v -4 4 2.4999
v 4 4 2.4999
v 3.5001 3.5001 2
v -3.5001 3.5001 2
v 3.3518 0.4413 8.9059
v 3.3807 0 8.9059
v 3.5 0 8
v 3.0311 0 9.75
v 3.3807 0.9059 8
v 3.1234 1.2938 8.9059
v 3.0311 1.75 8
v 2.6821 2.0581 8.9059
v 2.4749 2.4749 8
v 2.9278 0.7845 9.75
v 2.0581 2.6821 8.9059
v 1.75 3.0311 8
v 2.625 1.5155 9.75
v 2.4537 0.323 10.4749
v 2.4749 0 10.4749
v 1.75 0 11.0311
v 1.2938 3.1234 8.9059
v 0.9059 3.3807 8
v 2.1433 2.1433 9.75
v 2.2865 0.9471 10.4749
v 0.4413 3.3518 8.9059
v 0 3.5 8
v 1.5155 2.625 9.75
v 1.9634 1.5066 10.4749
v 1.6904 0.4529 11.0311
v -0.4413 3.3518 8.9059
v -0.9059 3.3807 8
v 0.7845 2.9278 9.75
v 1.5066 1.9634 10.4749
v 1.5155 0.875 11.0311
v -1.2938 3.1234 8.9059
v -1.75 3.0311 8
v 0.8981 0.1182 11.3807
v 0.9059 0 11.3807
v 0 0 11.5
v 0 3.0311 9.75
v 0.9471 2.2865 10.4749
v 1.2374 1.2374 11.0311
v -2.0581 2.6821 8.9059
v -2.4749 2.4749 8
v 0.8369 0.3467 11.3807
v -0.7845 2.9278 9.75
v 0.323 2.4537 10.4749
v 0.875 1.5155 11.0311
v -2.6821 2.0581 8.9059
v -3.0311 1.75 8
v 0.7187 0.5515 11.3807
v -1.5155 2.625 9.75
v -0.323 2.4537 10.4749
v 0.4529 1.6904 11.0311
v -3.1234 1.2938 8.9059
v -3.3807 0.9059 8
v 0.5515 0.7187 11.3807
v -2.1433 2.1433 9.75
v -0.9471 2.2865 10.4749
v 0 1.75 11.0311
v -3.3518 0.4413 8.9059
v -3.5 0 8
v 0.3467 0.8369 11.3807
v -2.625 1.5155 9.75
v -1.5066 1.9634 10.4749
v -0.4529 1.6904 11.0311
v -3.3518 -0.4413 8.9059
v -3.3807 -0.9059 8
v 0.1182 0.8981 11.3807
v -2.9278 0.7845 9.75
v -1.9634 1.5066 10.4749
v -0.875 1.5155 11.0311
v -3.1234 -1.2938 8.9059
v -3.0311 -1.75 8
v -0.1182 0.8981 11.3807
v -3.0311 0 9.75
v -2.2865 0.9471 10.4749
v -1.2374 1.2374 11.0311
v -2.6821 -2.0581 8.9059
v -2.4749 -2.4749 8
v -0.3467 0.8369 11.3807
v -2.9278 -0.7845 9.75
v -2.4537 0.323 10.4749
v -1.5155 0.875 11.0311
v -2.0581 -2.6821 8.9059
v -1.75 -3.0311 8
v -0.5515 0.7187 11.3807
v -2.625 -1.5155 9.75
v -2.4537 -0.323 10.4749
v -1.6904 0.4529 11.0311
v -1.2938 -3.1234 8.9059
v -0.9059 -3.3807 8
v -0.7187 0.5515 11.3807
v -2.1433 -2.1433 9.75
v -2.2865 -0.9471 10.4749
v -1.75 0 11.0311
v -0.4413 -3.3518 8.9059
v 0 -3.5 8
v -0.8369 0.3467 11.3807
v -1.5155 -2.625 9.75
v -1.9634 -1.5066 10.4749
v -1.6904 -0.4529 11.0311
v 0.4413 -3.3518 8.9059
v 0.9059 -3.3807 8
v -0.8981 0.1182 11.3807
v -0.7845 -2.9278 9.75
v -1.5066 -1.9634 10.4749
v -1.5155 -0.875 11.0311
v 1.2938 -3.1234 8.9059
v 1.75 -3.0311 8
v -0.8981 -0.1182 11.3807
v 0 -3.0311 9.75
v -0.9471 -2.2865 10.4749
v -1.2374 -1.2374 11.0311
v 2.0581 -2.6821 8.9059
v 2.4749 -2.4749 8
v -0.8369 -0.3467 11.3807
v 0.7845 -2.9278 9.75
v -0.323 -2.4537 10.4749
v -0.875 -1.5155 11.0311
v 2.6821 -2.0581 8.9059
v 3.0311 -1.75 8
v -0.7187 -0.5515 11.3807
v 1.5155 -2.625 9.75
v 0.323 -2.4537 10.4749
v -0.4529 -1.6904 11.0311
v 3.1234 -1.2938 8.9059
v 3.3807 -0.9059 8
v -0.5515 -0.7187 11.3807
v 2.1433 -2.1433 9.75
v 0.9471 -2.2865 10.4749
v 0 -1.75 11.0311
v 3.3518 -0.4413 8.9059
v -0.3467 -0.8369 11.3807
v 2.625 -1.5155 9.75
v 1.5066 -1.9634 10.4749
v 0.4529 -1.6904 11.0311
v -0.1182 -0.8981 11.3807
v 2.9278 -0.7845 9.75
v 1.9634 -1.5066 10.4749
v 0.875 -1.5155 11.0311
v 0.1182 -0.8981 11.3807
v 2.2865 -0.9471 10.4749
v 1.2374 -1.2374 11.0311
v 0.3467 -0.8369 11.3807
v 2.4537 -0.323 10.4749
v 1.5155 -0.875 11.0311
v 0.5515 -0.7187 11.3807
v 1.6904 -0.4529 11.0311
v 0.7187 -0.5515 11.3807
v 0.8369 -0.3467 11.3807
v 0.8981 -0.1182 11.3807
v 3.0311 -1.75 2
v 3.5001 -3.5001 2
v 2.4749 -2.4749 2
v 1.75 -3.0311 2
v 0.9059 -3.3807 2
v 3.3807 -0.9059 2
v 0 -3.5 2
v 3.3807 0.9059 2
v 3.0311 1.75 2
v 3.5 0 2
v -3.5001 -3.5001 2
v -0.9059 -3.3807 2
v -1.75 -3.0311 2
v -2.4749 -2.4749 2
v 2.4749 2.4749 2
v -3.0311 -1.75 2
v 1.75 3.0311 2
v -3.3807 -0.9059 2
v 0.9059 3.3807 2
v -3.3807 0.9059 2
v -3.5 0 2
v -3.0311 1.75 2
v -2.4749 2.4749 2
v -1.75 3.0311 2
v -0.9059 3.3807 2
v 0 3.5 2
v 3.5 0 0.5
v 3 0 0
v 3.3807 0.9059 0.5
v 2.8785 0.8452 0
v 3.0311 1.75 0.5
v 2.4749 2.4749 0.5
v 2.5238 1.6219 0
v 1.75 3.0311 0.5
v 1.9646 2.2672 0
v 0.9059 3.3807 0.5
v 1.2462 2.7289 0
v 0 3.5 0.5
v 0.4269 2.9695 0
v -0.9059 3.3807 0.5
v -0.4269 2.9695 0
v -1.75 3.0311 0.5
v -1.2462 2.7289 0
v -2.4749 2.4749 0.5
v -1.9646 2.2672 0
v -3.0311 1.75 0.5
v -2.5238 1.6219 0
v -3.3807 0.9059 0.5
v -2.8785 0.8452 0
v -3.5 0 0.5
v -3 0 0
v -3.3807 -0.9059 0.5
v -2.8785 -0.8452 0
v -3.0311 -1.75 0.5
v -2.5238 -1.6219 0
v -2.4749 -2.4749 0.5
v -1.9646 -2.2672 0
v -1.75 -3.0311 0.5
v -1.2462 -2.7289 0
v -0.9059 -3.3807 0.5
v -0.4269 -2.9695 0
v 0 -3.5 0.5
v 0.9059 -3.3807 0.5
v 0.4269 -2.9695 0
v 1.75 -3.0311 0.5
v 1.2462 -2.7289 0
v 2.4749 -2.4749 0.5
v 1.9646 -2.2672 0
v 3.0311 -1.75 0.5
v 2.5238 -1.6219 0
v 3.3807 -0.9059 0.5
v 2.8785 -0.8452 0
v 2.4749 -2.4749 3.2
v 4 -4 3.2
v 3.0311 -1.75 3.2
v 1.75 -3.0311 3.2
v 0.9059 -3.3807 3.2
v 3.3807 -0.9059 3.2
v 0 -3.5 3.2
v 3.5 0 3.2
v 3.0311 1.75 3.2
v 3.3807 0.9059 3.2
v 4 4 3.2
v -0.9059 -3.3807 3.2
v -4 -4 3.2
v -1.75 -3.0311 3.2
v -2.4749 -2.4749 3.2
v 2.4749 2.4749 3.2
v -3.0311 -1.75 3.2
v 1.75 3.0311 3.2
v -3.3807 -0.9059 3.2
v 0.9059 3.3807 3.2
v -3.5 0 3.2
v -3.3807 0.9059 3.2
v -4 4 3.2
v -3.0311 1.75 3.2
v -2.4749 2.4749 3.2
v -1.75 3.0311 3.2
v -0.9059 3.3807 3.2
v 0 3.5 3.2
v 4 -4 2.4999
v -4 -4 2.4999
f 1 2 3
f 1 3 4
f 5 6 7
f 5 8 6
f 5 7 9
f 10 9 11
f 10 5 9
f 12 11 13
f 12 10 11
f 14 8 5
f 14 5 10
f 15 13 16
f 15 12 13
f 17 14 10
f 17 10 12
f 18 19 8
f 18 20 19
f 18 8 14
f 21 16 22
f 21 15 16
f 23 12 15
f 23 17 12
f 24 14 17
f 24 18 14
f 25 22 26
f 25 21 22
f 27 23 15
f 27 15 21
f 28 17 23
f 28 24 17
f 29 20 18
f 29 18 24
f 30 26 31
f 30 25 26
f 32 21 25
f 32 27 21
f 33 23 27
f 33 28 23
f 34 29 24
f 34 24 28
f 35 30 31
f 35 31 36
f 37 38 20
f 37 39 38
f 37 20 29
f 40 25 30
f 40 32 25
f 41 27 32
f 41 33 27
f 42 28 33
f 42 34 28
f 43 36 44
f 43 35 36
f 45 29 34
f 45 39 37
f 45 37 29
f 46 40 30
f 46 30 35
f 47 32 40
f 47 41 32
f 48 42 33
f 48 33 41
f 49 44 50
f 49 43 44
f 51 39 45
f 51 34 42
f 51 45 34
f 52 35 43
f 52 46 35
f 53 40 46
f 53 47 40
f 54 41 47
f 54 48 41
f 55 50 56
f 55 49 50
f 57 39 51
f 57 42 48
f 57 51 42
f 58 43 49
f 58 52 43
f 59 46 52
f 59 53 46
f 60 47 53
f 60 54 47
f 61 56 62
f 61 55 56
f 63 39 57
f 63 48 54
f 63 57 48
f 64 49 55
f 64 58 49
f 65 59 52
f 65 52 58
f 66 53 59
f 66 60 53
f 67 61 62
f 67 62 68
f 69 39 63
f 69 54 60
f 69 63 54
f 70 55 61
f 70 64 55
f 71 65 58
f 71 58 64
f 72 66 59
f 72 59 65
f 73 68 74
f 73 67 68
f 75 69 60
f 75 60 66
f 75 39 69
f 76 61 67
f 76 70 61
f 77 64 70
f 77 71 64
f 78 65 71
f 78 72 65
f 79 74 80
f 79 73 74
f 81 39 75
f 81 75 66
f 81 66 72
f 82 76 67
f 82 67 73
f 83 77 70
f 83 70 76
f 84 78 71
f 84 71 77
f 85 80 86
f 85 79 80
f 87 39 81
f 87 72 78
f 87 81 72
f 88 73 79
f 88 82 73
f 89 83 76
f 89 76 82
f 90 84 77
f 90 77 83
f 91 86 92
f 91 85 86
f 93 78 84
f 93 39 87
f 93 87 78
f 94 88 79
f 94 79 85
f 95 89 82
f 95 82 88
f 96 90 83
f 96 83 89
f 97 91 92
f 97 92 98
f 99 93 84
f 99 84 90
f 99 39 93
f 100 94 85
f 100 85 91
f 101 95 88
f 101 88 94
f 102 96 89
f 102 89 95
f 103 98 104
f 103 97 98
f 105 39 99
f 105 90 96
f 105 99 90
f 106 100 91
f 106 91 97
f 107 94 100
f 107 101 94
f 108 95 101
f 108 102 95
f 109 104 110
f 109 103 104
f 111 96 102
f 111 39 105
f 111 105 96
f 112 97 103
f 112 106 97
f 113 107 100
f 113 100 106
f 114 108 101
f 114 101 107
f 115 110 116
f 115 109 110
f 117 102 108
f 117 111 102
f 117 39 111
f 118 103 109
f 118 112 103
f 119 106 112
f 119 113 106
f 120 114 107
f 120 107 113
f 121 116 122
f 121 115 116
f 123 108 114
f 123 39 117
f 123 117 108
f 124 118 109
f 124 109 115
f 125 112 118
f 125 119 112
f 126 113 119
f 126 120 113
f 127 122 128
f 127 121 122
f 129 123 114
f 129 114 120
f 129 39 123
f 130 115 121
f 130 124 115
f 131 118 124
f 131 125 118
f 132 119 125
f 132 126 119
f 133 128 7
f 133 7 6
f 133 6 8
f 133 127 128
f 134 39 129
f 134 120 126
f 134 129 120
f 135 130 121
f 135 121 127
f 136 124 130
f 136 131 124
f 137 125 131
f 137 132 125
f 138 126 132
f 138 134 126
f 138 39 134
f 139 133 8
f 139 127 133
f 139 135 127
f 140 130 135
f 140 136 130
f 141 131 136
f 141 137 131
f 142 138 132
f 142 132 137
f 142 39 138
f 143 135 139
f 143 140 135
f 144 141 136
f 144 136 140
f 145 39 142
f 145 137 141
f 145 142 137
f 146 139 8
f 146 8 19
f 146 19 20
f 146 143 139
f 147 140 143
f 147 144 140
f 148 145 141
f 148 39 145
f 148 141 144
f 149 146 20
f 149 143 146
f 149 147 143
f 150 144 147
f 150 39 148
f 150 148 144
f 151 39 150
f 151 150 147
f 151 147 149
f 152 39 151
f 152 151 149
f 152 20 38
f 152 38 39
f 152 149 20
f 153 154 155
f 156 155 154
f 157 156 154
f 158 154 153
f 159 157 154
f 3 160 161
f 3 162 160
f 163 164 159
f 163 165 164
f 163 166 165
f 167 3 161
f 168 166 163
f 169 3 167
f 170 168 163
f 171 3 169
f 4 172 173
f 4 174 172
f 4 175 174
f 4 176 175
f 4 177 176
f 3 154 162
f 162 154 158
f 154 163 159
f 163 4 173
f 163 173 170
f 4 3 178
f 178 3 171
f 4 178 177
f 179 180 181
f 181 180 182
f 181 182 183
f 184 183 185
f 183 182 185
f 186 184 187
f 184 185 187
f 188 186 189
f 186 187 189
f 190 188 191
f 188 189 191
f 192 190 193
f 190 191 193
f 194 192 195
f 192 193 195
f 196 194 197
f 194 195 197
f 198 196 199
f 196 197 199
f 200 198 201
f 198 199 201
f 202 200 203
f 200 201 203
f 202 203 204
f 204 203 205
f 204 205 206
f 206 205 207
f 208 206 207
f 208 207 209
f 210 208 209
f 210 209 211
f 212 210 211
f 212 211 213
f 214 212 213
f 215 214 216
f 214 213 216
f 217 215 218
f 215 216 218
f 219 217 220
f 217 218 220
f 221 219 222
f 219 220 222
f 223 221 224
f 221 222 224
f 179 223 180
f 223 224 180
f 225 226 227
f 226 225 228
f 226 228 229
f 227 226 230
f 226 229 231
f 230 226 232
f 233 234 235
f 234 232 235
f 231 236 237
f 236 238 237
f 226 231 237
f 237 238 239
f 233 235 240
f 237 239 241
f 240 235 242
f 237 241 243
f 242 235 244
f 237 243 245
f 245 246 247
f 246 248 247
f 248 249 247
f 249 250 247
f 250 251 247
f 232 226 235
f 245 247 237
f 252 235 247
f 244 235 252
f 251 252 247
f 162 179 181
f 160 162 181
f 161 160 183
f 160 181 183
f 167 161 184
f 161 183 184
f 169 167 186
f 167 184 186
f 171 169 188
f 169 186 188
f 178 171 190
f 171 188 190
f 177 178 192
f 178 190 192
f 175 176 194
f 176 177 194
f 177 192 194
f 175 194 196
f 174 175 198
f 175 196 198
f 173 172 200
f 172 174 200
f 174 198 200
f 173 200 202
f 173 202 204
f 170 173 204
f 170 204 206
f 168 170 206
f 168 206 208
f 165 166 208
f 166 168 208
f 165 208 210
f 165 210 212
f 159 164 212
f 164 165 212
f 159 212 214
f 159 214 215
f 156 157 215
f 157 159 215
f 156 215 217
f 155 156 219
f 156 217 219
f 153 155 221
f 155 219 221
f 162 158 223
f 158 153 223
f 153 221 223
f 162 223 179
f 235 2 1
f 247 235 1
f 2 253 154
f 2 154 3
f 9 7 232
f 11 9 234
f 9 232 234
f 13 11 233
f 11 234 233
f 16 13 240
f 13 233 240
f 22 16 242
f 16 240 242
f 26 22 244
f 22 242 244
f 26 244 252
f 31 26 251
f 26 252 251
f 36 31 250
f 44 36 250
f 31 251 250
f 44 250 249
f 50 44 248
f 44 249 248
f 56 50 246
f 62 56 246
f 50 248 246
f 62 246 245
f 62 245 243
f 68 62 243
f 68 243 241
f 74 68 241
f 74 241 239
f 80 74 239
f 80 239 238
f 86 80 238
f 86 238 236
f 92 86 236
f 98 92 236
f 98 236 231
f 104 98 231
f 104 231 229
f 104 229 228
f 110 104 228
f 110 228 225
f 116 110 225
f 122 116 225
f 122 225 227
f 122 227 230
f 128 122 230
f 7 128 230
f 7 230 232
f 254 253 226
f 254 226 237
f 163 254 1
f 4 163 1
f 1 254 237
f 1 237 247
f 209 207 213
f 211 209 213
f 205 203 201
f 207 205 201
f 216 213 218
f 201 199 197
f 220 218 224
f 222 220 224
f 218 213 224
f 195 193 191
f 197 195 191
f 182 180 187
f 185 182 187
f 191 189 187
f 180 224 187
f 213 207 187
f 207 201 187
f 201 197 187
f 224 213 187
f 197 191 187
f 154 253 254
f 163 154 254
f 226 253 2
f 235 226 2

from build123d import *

# Parameters (mm, degrees)
SKETCH1_R           = 3.5
BOSS_EXTRUDE1_DEPTH = 11.5
FILLET1_R           = 3.5
SKETCH3_W           = 8
SKETCH3_H           = 8
BOSS_EXTRUDE2_DEPTH = 1.2
CHAMFER1_SIZE       = 0.5
CHAMFER2_SIZE       = 0.5


with BuildPart() as part:
    # Sketch1 → Boss-Extrude1 (new body)
    with BuildSketch(Plane.XY):
        Circle(SKETCH1_R)
    extrude(amount=BOSS_EXTRUDE1_DEPTH)

    # Fillet1
    fillet1_edges = [part.edges().sort_by_distance(p)[0] for p in [
        (-3.5, 0, 11.5),
    ]]
    fillet(fillet1_edges, radius=FILLET1_R)

    # Sketch3 → Boss-Extrude2 (add)
    with BuildSketch(Plane(origin=(0, 0, 2), x_dir=(-1, 0, 0), z_dir=(0, 0, -1))):
        Rectangle(SKETCH3_W, SKETCH3_H)
    extrude(amount=-BOSS_EXTRUDE2_DEPTH)

    # Chamfer1
    chamfer1_edges = [part.edges().sort_by_distance(p)[0] for p in [
        (-3.5, 0, 0),
    ]]
    chamfer(chamfer1_edges, length=CHAMFER1_SIZE)

    # Chamfer2
    chamfer2_edges = [part.edges().sort_by_distance(p)[0] for p in [
        (4, 0, 2),
        (0, -4, 2),
        (-4, 0, 2),
        (0, 4, 2),
    ]]
    chamfer(chamfer2_edges, length=CHAMFER2_SIZE - 0.0001)  # a hair under: the kernel refuses the full size


solid = part.part
